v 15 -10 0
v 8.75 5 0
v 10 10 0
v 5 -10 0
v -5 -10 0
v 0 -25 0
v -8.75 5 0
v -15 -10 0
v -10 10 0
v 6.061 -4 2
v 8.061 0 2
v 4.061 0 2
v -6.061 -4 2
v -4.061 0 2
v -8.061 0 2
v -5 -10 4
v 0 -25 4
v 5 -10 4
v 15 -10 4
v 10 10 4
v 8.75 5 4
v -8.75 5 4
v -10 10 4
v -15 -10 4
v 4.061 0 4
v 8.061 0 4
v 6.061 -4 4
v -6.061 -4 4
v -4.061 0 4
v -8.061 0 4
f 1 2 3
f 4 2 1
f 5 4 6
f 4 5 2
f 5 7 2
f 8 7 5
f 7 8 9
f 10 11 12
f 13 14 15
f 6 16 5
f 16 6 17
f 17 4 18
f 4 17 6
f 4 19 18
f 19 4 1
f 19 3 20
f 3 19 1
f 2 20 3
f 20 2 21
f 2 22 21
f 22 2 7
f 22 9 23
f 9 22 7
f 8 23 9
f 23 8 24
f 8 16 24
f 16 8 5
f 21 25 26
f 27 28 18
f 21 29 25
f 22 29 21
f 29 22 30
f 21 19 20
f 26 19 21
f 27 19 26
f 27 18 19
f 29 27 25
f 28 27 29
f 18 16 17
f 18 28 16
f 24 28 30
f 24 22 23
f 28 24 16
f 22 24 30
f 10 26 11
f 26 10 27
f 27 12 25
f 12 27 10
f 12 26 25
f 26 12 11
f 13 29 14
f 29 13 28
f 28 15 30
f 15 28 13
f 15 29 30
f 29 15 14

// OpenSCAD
module equilateralTriangle(h,w){
	polygon([[-h/2,-w/2],[h/2,0],[-h/2,w/2]]);
}

baseDim = 20;

module foxHeadAbstract(){
	translate([0,-baseDim/2,0]) equilateralTriangle(h=-baseDim,w=baseDim/2);
	translate([0,baseDim/2,0]) equilateralTriangle(h=-baseDim,w=baseDim/2);
	translate([baseDim/2,0,0]) equilateralTriangle(h=baseDim*1.5,w=baseDim);
}
	
module withEyes(){
	difference(){
		foxHeadAbstract();
		translate([baseDim/10,-baseDim/3.3,0]) equilateralTriangle(h=baseDim/5,w=baseDim/5);
		translate([baseDim/10, baseDim/3.3,0]) equilateralTriangle(h=baseDim/5,w=baseDim/5);
	}
}

color("darkred") rotate(-90){
    linear_extrude(height=2) foxHeadAbstract();
    linear_extrude(height=4) withEyes();
}

// Written in 2020 by Scopeuk
//
// To the extent possible under law, the author(s) have dedicated all
// copyright and related and neighboring rights to this software to the
// public domain worldwide. This software is distributed without any
// warranty.
//
// You should have received a copy of the CC0 Public Domain
// Dedication along with this software.
// If not, see <http://creativecommons.org/publicdomain/zero/1.0/>.
